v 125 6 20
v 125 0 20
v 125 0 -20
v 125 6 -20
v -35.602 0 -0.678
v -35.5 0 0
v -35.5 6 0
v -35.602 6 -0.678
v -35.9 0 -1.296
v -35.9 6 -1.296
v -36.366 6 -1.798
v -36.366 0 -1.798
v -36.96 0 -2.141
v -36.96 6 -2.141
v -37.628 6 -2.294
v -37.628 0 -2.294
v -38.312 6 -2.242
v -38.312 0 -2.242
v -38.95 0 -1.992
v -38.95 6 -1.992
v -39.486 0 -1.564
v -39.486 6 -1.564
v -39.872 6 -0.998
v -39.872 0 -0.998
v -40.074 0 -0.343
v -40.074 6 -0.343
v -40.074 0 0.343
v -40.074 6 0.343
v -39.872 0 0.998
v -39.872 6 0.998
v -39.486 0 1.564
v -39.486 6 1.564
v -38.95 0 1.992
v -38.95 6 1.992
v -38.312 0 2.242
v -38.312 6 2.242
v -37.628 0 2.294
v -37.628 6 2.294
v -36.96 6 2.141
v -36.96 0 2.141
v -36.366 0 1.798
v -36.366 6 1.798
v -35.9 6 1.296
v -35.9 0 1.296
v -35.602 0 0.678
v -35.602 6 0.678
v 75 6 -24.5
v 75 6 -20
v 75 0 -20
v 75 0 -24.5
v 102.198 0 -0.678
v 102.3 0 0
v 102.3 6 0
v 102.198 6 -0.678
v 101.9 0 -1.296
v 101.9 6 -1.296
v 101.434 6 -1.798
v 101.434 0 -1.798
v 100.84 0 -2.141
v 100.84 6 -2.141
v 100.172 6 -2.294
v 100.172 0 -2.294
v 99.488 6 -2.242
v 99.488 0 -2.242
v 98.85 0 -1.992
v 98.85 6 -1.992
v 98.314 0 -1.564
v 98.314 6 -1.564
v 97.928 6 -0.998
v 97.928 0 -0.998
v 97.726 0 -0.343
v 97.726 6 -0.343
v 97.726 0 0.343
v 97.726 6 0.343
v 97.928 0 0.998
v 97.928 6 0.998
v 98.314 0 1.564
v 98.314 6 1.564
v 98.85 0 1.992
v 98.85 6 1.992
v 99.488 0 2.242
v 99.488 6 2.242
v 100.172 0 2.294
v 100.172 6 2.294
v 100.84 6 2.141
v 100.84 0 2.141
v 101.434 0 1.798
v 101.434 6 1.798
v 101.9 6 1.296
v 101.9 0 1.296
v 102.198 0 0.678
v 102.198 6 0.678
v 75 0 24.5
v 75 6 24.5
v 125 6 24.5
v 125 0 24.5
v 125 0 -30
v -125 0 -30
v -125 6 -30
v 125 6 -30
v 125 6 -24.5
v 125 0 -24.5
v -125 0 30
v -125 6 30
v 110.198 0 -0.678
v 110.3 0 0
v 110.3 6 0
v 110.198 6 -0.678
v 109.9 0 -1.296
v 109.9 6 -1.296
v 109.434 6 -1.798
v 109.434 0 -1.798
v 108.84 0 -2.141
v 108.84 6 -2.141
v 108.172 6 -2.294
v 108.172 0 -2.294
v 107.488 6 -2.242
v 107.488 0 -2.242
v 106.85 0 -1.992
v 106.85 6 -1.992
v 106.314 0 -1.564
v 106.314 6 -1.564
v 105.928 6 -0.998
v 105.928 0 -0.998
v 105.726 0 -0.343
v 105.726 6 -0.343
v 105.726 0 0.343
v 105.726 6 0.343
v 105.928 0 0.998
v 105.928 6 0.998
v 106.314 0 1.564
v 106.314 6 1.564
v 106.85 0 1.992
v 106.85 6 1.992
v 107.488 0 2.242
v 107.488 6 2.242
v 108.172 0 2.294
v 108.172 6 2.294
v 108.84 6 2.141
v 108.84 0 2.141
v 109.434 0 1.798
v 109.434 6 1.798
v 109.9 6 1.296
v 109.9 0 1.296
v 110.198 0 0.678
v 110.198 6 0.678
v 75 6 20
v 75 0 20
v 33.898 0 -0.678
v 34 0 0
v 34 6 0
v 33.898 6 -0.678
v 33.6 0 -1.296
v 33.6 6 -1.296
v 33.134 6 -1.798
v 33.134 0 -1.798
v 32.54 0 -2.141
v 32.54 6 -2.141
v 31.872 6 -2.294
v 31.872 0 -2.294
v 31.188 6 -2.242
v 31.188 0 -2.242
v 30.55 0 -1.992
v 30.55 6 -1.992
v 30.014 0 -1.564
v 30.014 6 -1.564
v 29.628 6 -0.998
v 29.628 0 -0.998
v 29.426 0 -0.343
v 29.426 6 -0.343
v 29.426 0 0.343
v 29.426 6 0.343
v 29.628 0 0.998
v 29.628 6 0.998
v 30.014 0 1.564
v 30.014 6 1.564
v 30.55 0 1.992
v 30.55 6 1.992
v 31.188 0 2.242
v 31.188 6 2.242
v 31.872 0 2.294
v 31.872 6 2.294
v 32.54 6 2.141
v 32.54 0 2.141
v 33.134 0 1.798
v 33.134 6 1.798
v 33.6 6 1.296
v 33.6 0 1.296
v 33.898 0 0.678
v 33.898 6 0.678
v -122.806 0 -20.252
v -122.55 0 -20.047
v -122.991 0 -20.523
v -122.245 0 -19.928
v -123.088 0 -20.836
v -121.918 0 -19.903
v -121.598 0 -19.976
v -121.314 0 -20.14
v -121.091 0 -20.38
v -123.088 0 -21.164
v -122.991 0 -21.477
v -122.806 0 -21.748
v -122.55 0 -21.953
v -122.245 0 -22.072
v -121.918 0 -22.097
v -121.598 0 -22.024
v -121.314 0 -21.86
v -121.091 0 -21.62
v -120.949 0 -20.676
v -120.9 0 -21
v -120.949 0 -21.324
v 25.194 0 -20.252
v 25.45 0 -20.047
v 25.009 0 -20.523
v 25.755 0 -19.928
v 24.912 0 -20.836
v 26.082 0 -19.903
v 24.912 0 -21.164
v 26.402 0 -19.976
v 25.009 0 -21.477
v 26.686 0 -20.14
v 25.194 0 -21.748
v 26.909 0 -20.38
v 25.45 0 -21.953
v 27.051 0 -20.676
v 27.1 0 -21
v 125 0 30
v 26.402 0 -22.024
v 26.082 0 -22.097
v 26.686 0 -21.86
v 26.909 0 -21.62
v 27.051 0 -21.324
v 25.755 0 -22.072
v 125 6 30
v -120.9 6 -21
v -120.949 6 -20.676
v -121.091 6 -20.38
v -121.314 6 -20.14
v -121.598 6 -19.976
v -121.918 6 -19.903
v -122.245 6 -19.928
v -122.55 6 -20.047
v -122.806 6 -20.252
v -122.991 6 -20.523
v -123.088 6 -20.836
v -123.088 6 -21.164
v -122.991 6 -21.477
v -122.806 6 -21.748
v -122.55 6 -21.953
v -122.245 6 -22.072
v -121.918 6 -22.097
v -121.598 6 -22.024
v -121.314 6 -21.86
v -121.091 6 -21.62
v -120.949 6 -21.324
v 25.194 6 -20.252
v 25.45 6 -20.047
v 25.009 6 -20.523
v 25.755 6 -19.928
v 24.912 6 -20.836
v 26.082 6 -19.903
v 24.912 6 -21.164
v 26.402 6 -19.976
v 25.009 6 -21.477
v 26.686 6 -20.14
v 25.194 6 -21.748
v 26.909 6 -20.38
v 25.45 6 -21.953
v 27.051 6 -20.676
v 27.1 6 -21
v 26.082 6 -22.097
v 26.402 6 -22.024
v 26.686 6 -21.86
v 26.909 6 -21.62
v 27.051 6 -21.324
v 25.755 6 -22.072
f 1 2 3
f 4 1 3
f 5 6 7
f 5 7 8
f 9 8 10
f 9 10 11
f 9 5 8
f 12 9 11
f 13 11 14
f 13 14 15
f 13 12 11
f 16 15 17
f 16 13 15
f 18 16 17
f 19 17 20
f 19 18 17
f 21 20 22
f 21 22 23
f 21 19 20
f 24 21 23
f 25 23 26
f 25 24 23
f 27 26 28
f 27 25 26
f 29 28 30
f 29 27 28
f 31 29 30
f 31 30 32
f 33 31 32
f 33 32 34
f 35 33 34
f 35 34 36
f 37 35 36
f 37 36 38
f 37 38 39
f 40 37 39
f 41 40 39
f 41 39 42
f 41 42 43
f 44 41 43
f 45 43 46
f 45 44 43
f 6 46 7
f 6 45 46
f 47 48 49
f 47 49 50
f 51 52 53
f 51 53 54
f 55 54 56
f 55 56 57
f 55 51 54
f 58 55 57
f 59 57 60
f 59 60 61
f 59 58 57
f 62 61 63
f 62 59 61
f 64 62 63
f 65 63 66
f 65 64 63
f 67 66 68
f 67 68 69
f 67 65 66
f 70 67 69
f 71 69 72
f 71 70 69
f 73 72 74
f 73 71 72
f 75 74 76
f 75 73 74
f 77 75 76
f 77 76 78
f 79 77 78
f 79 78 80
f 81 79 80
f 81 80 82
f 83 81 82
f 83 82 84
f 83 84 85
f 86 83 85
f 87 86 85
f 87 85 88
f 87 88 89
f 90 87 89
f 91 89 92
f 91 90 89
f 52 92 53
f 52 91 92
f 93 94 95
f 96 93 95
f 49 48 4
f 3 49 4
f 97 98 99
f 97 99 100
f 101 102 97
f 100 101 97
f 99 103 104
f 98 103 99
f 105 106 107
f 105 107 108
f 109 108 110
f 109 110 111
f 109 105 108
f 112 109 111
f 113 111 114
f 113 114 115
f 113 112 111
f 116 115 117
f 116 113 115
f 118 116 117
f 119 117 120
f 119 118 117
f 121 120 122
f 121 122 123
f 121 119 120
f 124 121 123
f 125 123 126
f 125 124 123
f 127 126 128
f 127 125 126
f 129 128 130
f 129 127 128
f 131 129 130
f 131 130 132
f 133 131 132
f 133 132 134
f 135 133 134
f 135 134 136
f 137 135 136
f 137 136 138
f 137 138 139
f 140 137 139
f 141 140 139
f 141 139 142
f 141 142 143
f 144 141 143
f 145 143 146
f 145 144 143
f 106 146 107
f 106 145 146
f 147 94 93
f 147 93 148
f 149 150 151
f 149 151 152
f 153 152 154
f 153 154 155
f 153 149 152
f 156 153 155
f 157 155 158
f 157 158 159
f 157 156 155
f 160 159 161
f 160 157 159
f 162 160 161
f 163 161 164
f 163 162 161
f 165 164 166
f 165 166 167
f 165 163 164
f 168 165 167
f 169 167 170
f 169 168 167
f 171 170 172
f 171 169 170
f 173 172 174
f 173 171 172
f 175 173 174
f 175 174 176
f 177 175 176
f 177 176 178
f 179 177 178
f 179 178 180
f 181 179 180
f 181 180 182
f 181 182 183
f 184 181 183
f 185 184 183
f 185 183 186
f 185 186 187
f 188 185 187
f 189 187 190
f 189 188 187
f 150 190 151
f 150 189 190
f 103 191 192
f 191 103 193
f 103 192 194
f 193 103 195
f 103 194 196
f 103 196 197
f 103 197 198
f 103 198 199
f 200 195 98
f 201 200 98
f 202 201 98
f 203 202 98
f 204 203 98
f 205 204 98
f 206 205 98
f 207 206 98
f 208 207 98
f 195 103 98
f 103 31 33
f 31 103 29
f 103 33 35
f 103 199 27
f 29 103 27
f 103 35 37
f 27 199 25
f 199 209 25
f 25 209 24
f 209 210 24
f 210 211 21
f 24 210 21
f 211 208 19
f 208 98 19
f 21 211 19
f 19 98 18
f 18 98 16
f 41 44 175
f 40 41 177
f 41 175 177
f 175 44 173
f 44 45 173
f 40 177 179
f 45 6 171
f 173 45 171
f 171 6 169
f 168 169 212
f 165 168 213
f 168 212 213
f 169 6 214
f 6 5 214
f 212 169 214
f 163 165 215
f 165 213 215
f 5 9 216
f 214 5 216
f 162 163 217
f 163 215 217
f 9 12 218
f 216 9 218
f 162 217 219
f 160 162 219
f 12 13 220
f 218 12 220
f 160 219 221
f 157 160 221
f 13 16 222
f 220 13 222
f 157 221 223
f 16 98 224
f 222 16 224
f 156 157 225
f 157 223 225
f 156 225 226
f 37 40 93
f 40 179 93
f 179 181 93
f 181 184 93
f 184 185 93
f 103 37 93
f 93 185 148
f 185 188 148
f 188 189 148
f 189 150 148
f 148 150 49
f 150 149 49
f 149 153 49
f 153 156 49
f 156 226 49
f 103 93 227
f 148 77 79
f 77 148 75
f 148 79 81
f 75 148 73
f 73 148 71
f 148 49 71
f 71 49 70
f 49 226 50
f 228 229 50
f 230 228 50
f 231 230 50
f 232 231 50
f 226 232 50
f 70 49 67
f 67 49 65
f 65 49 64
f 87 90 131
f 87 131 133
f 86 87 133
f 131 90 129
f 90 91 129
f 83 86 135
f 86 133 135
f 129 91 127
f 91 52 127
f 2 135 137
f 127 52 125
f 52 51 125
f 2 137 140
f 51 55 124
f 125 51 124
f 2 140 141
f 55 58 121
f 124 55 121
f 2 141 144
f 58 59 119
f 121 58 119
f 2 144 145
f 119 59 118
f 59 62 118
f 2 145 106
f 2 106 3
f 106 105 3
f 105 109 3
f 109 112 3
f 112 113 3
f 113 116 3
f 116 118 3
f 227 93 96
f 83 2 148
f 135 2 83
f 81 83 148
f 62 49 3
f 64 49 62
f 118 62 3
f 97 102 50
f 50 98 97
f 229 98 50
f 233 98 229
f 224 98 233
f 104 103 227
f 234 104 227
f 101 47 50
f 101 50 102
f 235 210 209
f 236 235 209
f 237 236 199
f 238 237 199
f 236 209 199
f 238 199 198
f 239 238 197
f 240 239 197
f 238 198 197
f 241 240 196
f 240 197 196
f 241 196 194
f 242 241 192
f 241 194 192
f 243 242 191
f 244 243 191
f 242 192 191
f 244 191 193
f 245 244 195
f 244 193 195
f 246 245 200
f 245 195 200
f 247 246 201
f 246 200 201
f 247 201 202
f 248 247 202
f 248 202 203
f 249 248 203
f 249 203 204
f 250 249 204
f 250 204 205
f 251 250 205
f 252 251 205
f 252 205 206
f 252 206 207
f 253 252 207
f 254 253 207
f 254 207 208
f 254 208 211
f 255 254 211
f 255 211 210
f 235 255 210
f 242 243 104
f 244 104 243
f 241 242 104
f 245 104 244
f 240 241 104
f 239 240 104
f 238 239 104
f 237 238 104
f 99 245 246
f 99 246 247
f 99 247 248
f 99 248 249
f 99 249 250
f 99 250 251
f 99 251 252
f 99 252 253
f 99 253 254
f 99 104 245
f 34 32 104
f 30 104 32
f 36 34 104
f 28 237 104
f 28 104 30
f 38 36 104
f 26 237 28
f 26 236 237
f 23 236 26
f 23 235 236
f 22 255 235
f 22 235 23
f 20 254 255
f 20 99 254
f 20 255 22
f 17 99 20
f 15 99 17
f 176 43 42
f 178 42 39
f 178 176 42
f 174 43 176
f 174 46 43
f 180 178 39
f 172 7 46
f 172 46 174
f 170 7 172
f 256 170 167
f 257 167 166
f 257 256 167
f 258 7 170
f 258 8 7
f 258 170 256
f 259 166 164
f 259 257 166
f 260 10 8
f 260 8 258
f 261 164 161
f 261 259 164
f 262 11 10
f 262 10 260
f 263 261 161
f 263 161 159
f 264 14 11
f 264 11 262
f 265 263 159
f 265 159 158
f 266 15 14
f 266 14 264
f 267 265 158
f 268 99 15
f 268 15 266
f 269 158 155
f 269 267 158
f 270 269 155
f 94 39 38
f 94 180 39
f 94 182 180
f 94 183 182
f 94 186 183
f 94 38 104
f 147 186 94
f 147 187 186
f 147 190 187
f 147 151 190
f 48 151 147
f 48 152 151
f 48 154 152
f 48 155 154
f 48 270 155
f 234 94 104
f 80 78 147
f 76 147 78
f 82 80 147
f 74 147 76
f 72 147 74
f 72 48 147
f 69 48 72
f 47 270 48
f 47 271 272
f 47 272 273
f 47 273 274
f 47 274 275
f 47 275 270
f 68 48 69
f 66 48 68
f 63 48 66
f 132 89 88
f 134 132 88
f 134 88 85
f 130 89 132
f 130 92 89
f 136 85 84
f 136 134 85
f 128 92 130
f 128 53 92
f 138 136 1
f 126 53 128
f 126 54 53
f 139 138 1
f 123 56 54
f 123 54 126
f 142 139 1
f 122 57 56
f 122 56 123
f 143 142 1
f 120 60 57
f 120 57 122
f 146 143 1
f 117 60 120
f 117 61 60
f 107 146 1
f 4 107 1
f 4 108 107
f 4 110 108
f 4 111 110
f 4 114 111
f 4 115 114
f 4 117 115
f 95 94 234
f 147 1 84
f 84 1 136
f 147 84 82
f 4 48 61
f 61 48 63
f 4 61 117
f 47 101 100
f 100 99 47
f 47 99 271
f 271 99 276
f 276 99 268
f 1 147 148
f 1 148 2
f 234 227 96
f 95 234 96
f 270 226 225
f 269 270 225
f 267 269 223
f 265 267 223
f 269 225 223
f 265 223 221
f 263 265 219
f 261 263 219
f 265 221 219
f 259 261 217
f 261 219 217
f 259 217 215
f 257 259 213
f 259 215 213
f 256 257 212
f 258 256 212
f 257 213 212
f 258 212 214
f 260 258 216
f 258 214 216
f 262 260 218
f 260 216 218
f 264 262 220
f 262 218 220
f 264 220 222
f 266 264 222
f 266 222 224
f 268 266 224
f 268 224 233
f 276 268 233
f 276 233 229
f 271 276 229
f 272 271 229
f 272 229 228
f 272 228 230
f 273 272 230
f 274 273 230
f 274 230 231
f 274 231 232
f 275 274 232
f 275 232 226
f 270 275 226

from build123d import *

# Parameters (mm, degrees)
SKETCH1_W           = 250
SKETCH1_H           = 60
SKETCH1_R           = 2.3
BOSS_EXTRUDE1_DEPTH = 6
SKETCH2_W           = 50
SKETCH2_H           = 4.5
CUT_EXTRUDE1_DEPTH  = 6
SKETCH3_R           = 1.1
CUT_EXTRUDE2_DEPTH  = 10


with BuildPart() as part:
    # Sketch1 → Boss-Extrude1 (new body)
    with BuildSketch(Plane(origin=(0, 0, 0), x_dir=(1, 0, 0), z_dir=(0, 1, 0))):
        Rectangle(SKETCH1_W, SKETCH1_H)
        with Locations((108, 0)):
            Circle(SKETCH1_R, mode=Mode.SUBTRACT)
        with Locations((100, 0)):
            Circle(SKETCH1_R, mode=Mode.SUBTRACT)
        with Locations((31.7, 0)):
            Circle(SKETCH1_R, mode=Mode.SUBTRACT)
        with Locations((-37.8, 0)):
            Circle(SKETCH1_R, mode=Mode.SUBTRACT)
    extrude(amount=BOSS_EXTRUDE1_DEPTH)

    # Sketch2 → Cut-Extrude1 (cut)
    with BuildSketch(Plane(origin=(0, 6, 0), x_dir=(1, 0, 0), z_dir=(0, 1, 0))):
        with Locations((100, -22.25)):
            Rectangle(SKETCH2_W, SKETCH2_H)
        with Locations((100, 22.25)):
            Rectangle(SKETCH2_W, SKETCH2_H)
    extrude(amount=-CUT_EXTRUDE1_DEPTH, mode=Mode.SUBTRACT)

    # Sketch3 → Cut-Extrude2 (cut)
    with BuildSketch(Plane.XZ):
        with Locations((-122, -21)):
            Circle(SKETCH3_R)
        with Locations((26, -21)):
            Circle(SKETCH3_R)
    extrude(amount=-CUT_EXTRUDE2_DEPTH, mode=Mode.SUBTRACT)


solid = part.part
